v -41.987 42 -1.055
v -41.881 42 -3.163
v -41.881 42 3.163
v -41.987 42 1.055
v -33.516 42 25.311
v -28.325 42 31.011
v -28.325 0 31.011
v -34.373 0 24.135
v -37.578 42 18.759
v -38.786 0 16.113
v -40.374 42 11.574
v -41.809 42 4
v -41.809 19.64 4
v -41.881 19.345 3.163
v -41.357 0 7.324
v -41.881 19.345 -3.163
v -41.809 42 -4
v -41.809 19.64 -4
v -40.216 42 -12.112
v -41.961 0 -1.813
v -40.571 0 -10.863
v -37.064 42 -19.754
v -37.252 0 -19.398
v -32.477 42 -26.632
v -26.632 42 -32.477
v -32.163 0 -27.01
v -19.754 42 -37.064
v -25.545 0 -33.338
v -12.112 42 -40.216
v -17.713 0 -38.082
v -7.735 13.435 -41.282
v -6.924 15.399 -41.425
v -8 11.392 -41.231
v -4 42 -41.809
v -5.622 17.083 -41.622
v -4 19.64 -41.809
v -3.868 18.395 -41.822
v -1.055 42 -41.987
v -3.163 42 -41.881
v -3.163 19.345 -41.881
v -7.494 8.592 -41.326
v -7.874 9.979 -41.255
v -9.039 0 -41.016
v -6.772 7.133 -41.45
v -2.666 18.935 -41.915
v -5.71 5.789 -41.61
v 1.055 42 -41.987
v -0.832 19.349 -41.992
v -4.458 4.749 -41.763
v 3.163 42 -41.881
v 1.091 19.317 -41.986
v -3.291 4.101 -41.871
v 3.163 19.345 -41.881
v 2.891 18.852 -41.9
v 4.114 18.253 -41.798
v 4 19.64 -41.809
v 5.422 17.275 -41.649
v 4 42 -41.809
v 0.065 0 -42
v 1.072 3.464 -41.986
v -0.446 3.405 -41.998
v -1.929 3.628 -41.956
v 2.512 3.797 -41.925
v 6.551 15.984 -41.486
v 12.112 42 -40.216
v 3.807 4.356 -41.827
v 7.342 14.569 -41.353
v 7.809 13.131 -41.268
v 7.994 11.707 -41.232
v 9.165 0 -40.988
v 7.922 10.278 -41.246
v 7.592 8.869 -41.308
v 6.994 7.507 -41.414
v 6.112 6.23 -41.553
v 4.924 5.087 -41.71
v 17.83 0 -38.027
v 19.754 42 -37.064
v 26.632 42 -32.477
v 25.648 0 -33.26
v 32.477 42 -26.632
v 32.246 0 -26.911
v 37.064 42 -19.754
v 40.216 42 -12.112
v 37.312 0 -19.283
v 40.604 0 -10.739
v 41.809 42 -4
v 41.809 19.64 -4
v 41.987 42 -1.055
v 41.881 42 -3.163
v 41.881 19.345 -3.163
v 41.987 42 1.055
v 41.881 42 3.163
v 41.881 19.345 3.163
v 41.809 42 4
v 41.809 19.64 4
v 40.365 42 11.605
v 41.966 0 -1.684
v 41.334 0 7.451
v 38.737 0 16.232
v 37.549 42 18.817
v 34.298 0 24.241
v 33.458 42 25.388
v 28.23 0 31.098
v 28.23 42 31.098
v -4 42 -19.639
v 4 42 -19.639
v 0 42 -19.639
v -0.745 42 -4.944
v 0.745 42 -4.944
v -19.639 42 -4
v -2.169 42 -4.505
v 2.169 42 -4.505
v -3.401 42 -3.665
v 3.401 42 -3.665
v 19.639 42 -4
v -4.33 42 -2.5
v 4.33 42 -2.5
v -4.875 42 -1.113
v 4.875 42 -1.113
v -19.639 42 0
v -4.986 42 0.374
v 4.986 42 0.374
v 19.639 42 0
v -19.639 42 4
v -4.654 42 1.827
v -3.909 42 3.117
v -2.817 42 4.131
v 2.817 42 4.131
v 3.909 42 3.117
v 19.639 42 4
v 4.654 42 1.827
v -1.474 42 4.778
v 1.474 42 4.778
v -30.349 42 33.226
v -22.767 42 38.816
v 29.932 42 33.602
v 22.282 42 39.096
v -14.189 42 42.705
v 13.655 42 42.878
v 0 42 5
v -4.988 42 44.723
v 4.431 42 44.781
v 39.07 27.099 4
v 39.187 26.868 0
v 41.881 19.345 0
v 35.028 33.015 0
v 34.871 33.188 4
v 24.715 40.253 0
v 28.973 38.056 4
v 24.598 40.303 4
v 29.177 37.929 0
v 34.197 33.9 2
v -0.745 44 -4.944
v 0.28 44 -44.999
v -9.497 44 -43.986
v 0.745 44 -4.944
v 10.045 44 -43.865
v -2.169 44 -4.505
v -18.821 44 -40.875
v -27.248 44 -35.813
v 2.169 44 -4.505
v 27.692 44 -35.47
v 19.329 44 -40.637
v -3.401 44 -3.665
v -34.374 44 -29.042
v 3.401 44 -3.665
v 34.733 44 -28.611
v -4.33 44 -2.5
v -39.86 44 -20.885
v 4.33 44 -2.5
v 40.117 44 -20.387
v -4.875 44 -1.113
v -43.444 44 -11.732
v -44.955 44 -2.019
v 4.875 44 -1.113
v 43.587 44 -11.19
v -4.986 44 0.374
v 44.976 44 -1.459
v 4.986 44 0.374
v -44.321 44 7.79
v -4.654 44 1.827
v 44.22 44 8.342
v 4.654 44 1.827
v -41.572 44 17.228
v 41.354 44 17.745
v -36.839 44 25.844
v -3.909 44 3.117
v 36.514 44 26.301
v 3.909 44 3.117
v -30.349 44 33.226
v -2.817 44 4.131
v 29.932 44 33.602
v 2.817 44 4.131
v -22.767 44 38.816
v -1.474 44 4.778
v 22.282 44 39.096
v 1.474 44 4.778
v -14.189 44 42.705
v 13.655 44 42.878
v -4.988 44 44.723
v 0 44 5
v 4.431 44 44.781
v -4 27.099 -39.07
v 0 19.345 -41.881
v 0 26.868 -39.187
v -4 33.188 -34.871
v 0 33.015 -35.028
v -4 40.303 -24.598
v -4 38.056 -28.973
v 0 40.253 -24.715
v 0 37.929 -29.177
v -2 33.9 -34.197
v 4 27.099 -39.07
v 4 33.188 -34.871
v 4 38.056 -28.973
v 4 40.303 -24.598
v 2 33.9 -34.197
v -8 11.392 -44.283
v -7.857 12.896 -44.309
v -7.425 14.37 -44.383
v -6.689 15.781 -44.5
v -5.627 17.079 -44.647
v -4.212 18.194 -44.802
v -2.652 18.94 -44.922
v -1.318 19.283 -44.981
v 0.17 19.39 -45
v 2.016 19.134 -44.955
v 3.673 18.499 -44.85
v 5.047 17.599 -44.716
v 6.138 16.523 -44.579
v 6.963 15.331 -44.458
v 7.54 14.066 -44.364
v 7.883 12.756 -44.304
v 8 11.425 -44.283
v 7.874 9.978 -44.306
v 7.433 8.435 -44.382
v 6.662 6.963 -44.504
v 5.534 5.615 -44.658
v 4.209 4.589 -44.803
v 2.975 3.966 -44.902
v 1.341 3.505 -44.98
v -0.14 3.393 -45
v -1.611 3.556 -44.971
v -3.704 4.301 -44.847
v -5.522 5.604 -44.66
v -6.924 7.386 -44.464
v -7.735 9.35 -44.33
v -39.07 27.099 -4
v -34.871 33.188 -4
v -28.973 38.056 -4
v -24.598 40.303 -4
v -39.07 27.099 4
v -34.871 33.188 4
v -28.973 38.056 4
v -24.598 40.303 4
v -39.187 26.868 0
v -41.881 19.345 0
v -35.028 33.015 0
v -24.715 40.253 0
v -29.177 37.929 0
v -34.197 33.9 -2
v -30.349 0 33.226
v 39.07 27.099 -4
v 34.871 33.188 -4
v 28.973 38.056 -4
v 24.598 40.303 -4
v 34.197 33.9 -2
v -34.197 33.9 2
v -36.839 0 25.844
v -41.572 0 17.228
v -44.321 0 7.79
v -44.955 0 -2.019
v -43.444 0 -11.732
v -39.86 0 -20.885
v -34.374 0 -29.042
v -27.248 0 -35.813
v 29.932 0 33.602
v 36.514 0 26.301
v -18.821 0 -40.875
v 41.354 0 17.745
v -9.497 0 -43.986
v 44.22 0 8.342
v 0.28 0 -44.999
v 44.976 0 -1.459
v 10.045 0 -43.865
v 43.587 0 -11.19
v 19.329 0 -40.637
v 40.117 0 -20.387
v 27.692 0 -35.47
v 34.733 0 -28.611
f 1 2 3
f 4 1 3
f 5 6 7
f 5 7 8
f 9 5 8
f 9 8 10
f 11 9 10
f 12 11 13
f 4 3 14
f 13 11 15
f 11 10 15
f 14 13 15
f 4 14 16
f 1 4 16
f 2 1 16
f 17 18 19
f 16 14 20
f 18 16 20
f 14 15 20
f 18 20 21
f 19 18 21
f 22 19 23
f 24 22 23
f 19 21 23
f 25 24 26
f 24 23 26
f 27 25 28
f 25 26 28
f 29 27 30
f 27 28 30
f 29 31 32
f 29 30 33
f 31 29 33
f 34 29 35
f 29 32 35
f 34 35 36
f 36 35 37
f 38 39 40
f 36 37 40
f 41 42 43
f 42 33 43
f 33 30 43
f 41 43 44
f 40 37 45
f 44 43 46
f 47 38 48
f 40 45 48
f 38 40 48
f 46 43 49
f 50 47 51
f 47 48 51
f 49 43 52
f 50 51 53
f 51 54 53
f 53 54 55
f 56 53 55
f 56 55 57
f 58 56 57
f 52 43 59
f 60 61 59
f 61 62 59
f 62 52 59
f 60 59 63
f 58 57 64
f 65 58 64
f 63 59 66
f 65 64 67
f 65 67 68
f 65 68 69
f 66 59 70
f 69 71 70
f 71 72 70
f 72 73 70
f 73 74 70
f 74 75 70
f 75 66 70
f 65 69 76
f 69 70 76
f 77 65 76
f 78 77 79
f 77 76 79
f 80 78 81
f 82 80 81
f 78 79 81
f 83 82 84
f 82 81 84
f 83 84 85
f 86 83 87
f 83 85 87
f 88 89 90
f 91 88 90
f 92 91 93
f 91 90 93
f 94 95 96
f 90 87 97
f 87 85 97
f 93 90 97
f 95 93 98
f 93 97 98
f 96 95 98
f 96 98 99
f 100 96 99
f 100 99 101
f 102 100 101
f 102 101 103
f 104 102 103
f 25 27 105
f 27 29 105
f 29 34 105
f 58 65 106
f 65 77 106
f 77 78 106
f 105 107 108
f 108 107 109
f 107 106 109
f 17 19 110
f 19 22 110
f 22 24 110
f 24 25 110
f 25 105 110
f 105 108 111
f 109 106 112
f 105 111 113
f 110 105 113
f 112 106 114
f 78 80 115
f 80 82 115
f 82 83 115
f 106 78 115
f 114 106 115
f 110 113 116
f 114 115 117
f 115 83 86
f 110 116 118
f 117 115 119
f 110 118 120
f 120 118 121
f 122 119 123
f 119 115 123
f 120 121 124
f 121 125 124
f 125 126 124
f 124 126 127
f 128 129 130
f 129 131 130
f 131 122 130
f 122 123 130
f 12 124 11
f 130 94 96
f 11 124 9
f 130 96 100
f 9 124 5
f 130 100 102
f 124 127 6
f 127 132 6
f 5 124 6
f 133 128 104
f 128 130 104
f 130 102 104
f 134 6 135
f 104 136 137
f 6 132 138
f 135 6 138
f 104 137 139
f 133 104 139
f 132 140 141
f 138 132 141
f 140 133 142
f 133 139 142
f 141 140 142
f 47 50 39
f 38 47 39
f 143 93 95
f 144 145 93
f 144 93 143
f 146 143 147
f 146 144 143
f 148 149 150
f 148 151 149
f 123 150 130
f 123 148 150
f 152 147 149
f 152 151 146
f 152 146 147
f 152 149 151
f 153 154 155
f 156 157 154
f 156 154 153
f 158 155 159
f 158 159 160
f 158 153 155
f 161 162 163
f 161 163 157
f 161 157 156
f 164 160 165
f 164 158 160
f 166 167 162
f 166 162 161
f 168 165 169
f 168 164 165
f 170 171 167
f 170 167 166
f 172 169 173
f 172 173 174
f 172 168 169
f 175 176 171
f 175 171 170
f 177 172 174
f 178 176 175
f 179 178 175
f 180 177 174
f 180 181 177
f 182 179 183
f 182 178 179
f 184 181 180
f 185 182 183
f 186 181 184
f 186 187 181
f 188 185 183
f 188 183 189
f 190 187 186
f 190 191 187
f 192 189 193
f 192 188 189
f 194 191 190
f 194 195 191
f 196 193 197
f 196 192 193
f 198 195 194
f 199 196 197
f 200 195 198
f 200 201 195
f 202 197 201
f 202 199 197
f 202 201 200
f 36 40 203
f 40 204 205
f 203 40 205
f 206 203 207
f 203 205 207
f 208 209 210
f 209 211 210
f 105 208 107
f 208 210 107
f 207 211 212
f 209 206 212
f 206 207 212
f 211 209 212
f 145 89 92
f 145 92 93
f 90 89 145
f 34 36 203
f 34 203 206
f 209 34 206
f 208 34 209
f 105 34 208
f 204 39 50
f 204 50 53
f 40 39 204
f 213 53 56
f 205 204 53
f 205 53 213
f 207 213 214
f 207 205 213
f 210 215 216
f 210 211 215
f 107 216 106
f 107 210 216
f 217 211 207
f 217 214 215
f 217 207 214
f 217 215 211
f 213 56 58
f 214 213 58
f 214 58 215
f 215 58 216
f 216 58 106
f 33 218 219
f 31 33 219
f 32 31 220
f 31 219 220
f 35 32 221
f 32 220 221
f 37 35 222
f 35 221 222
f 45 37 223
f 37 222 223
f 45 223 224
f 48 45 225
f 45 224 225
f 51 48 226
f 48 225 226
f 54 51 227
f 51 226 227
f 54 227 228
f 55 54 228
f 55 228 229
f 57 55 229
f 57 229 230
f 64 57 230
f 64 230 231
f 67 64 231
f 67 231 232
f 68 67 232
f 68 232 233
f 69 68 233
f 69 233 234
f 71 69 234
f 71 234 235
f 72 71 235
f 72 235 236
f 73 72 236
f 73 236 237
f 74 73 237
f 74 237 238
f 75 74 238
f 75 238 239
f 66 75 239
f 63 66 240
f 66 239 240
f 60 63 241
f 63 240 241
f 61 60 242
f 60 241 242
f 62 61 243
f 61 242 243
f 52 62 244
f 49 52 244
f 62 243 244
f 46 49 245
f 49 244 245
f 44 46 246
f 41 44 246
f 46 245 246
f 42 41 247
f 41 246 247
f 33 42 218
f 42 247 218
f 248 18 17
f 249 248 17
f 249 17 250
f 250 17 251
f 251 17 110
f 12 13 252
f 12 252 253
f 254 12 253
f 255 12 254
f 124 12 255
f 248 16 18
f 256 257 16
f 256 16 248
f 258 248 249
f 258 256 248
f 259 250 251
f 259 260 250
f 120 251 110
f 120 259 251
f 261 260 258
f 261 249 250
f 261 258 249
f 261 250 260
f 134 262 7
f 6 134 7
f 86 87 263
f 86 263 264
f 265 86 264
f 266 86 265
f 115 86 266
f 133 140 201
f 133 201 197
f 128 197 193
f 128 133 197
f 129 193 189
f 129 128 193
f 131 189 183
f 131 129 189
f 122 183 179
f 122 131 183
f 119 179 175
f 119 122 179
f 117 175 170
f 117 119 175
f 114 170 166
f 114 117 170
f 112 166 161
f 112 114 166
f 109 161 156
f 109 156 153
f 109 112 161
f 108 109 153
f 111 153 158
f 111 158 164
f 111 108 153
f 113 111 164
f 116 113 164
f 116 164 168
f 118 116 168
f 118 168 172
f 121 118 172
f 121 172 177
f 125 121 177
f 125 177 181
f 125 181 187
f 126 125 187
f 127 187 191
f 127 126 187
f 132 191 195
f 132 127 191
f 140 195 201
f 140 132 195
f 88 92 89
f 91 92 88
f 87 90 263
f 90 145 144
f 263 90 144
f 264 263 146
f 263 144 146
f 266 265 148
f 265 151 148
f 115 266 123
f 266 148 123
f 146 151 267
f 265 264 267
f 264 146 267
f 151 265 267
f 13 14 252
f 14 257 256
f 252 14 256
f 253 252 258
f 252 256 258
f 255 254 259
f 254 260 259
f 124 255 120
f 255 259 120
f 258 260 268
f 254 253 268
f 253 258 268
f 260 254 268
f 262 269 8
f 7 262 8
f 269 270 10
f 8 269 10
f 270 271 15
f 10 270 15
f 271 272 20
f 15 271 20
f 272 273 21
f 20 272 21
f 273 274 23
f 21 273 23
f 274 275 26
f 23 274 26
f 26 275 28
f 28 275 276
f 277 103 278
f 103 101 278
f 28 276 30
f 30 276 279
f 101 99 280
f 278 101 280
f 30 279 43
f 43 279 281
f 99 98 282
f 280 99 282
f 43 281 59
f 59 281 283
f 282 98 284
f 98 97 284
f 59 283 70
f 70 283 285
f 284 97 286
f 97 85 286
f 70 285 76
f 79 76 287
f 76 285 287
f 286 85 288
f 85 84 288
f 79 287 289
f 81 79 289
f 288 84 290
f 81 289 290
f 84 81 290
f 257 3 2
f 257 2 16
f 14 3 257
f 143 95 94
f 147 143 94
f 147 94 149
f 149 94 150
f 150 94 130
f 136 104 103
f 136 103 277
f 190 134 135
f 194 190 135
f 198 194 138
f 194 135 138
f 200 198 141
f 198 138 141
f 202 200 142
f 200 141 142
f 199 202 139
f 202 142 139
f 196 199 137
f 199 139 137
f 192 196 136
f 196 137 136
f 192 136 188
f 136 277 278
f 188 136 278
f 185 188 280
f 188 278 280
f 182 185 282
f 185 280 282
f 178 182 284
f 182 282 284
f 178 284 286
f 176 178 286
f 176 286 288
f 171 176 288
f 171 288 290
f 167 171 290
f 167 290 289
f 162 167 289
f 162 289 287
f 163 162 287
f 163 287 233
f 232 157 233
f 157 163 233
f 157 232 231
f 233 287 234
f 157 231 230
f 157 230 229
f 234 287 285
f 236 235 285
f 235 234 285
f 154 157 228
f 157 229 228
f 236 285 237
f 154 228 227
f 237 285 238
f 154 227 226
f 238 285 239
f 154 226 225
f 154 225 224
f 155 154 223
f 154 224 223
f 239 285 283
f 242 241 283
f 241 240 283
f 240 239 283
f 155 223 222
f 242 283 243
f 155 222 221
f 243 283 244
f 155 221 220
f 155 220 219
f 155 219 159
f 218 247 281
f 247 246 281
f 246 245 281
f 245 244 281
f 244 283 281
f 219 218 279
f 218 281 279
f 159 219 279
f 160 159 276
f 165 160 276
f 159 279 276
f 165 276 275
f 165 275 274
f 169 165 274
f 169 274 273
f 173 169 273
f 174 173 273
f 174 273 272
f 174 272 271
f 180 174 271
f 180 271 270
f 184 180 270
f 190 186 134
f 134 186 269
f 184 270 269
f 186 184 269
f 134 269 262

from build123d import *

# Parameters (mm, degrees)
AUFSATZ_LINEAR_AUSTRAGEN1_DEPTH = 44
AUFSATZ_LINEAR_START            = -2
SKIZZE2_R                       = 45
SKIZZE2_R_2                     = 5
AUFSATZ_LINEAR_AUSTRAGEN2_DEPTH = 2
SKIZZE3_R                       = 8
SCHNITT_LINEAR_AUSTRAGEN2_DEPTH = 9.26
AUFSATZ_LINEAR_AUSTRAGEN3_DEPTH = 4
KREISMUSTER1_COUNT              = 3
KREISMUSTER1_ANGLE              = 180


with BuildPart() as part:
    # Skizze1 → Aufsatz-Linear austragen1 (new body)
    with BuildSketch(Plane(origin=(0, 0, 0), x_dir=(1, 0, 0), z_dir=(0, 1, 0))):
        with BuildLine():
            Line((28.22984402, -31.097844083), (29.932068323, -33.601655999))
            ThreePointArc((29.932068323, -33.601655999), (0.280437371, 44.999126157), (-30.348542355, -33.225983461))
            Line((-30.348542355, -33.225983461), (-28.325306198, -31.010917897))
            ThreePointArc((-28.325306198, -31.010917897), (0.064554608, 41.999950389), (28.22984402, -31.097844083))
        make_face()
    extrude(amount=AUFSATZ_LINEAR_AUSTRAGEN1_DEPTH)

    # Skizze2 → Aufsatz-Linear austragen2 (add)
    with BuildSketch(Plane(origin=(0, 44, 0), x_dir=(1, 0, 0), z_dir=(0, 1, 0)).offset(AUFSATZ_LINEAR_START)):
        with Locations(Location((0, 0, 0), (0, 0, 227.591490679))):
            Circle(SKIZZE2_R)
        with Locations(Location((0, 0, 0), (0, 0, 270))):
            Circle(SKIZZE2_R_2, mode=Mode.SUBTRACT)
    extrude(amount=AUFSATZ_LINEAR_AUSTRAGEN2_DEPTH)

    # Skizze3 → Schnitt-Linear austragen2 (cut)
    with BuildSketch(Plane(origin=(0, 0, -45), x_dir=(-1, 0, 0), z_dir=(0, 0, -1))):
        with Locations((0, 11.392175051)):
            Circle(SKIZZE3_R)
    extrude(amount=-SCHNITT_LINEAR_AUSTRAGEN2_DEPTH, mode=Mode.SUBTRACT)

    # Skizze4 → Aufsatz-Linear austragen3 (add, symmetric)
    with BuildSketch(Plane.XY):
        with BuildLine():
            Line((-41.880766109, 42), (-41.880766109, 19.345066602))
            add(Edge.make_bspline(
                [(-41.880766109, 19.345066602), (-37.634088063, 37.128030919), (-19.638651498, 42)],
                knots=[0, 0, 0, 1, 1, 1], degree=2))
            Line((-19.638651498, 42), (-41.880766109, 42))
        make_face()
    aufsatz_linear_austragen3 = extrude(amount=AUFSATZ_LINEAR_AUSTRAGEN3_DEPTH, both=True)

    # Kreismuster1: Aufsatz-Linear austragen3 ×3 about axis
    kreismuster1_axis = Axis((0, 42, 0), (0, -1, 0))
    for i in range(1, KREISMUSTER1_COUNT):
        add(aufsatz_linear_austragen3.rotate(kreismuster1_axis, i * KREISMUSTER1_ANGLE / (KREISMUSTER1_COUNT - 1)))


solid = part.part
